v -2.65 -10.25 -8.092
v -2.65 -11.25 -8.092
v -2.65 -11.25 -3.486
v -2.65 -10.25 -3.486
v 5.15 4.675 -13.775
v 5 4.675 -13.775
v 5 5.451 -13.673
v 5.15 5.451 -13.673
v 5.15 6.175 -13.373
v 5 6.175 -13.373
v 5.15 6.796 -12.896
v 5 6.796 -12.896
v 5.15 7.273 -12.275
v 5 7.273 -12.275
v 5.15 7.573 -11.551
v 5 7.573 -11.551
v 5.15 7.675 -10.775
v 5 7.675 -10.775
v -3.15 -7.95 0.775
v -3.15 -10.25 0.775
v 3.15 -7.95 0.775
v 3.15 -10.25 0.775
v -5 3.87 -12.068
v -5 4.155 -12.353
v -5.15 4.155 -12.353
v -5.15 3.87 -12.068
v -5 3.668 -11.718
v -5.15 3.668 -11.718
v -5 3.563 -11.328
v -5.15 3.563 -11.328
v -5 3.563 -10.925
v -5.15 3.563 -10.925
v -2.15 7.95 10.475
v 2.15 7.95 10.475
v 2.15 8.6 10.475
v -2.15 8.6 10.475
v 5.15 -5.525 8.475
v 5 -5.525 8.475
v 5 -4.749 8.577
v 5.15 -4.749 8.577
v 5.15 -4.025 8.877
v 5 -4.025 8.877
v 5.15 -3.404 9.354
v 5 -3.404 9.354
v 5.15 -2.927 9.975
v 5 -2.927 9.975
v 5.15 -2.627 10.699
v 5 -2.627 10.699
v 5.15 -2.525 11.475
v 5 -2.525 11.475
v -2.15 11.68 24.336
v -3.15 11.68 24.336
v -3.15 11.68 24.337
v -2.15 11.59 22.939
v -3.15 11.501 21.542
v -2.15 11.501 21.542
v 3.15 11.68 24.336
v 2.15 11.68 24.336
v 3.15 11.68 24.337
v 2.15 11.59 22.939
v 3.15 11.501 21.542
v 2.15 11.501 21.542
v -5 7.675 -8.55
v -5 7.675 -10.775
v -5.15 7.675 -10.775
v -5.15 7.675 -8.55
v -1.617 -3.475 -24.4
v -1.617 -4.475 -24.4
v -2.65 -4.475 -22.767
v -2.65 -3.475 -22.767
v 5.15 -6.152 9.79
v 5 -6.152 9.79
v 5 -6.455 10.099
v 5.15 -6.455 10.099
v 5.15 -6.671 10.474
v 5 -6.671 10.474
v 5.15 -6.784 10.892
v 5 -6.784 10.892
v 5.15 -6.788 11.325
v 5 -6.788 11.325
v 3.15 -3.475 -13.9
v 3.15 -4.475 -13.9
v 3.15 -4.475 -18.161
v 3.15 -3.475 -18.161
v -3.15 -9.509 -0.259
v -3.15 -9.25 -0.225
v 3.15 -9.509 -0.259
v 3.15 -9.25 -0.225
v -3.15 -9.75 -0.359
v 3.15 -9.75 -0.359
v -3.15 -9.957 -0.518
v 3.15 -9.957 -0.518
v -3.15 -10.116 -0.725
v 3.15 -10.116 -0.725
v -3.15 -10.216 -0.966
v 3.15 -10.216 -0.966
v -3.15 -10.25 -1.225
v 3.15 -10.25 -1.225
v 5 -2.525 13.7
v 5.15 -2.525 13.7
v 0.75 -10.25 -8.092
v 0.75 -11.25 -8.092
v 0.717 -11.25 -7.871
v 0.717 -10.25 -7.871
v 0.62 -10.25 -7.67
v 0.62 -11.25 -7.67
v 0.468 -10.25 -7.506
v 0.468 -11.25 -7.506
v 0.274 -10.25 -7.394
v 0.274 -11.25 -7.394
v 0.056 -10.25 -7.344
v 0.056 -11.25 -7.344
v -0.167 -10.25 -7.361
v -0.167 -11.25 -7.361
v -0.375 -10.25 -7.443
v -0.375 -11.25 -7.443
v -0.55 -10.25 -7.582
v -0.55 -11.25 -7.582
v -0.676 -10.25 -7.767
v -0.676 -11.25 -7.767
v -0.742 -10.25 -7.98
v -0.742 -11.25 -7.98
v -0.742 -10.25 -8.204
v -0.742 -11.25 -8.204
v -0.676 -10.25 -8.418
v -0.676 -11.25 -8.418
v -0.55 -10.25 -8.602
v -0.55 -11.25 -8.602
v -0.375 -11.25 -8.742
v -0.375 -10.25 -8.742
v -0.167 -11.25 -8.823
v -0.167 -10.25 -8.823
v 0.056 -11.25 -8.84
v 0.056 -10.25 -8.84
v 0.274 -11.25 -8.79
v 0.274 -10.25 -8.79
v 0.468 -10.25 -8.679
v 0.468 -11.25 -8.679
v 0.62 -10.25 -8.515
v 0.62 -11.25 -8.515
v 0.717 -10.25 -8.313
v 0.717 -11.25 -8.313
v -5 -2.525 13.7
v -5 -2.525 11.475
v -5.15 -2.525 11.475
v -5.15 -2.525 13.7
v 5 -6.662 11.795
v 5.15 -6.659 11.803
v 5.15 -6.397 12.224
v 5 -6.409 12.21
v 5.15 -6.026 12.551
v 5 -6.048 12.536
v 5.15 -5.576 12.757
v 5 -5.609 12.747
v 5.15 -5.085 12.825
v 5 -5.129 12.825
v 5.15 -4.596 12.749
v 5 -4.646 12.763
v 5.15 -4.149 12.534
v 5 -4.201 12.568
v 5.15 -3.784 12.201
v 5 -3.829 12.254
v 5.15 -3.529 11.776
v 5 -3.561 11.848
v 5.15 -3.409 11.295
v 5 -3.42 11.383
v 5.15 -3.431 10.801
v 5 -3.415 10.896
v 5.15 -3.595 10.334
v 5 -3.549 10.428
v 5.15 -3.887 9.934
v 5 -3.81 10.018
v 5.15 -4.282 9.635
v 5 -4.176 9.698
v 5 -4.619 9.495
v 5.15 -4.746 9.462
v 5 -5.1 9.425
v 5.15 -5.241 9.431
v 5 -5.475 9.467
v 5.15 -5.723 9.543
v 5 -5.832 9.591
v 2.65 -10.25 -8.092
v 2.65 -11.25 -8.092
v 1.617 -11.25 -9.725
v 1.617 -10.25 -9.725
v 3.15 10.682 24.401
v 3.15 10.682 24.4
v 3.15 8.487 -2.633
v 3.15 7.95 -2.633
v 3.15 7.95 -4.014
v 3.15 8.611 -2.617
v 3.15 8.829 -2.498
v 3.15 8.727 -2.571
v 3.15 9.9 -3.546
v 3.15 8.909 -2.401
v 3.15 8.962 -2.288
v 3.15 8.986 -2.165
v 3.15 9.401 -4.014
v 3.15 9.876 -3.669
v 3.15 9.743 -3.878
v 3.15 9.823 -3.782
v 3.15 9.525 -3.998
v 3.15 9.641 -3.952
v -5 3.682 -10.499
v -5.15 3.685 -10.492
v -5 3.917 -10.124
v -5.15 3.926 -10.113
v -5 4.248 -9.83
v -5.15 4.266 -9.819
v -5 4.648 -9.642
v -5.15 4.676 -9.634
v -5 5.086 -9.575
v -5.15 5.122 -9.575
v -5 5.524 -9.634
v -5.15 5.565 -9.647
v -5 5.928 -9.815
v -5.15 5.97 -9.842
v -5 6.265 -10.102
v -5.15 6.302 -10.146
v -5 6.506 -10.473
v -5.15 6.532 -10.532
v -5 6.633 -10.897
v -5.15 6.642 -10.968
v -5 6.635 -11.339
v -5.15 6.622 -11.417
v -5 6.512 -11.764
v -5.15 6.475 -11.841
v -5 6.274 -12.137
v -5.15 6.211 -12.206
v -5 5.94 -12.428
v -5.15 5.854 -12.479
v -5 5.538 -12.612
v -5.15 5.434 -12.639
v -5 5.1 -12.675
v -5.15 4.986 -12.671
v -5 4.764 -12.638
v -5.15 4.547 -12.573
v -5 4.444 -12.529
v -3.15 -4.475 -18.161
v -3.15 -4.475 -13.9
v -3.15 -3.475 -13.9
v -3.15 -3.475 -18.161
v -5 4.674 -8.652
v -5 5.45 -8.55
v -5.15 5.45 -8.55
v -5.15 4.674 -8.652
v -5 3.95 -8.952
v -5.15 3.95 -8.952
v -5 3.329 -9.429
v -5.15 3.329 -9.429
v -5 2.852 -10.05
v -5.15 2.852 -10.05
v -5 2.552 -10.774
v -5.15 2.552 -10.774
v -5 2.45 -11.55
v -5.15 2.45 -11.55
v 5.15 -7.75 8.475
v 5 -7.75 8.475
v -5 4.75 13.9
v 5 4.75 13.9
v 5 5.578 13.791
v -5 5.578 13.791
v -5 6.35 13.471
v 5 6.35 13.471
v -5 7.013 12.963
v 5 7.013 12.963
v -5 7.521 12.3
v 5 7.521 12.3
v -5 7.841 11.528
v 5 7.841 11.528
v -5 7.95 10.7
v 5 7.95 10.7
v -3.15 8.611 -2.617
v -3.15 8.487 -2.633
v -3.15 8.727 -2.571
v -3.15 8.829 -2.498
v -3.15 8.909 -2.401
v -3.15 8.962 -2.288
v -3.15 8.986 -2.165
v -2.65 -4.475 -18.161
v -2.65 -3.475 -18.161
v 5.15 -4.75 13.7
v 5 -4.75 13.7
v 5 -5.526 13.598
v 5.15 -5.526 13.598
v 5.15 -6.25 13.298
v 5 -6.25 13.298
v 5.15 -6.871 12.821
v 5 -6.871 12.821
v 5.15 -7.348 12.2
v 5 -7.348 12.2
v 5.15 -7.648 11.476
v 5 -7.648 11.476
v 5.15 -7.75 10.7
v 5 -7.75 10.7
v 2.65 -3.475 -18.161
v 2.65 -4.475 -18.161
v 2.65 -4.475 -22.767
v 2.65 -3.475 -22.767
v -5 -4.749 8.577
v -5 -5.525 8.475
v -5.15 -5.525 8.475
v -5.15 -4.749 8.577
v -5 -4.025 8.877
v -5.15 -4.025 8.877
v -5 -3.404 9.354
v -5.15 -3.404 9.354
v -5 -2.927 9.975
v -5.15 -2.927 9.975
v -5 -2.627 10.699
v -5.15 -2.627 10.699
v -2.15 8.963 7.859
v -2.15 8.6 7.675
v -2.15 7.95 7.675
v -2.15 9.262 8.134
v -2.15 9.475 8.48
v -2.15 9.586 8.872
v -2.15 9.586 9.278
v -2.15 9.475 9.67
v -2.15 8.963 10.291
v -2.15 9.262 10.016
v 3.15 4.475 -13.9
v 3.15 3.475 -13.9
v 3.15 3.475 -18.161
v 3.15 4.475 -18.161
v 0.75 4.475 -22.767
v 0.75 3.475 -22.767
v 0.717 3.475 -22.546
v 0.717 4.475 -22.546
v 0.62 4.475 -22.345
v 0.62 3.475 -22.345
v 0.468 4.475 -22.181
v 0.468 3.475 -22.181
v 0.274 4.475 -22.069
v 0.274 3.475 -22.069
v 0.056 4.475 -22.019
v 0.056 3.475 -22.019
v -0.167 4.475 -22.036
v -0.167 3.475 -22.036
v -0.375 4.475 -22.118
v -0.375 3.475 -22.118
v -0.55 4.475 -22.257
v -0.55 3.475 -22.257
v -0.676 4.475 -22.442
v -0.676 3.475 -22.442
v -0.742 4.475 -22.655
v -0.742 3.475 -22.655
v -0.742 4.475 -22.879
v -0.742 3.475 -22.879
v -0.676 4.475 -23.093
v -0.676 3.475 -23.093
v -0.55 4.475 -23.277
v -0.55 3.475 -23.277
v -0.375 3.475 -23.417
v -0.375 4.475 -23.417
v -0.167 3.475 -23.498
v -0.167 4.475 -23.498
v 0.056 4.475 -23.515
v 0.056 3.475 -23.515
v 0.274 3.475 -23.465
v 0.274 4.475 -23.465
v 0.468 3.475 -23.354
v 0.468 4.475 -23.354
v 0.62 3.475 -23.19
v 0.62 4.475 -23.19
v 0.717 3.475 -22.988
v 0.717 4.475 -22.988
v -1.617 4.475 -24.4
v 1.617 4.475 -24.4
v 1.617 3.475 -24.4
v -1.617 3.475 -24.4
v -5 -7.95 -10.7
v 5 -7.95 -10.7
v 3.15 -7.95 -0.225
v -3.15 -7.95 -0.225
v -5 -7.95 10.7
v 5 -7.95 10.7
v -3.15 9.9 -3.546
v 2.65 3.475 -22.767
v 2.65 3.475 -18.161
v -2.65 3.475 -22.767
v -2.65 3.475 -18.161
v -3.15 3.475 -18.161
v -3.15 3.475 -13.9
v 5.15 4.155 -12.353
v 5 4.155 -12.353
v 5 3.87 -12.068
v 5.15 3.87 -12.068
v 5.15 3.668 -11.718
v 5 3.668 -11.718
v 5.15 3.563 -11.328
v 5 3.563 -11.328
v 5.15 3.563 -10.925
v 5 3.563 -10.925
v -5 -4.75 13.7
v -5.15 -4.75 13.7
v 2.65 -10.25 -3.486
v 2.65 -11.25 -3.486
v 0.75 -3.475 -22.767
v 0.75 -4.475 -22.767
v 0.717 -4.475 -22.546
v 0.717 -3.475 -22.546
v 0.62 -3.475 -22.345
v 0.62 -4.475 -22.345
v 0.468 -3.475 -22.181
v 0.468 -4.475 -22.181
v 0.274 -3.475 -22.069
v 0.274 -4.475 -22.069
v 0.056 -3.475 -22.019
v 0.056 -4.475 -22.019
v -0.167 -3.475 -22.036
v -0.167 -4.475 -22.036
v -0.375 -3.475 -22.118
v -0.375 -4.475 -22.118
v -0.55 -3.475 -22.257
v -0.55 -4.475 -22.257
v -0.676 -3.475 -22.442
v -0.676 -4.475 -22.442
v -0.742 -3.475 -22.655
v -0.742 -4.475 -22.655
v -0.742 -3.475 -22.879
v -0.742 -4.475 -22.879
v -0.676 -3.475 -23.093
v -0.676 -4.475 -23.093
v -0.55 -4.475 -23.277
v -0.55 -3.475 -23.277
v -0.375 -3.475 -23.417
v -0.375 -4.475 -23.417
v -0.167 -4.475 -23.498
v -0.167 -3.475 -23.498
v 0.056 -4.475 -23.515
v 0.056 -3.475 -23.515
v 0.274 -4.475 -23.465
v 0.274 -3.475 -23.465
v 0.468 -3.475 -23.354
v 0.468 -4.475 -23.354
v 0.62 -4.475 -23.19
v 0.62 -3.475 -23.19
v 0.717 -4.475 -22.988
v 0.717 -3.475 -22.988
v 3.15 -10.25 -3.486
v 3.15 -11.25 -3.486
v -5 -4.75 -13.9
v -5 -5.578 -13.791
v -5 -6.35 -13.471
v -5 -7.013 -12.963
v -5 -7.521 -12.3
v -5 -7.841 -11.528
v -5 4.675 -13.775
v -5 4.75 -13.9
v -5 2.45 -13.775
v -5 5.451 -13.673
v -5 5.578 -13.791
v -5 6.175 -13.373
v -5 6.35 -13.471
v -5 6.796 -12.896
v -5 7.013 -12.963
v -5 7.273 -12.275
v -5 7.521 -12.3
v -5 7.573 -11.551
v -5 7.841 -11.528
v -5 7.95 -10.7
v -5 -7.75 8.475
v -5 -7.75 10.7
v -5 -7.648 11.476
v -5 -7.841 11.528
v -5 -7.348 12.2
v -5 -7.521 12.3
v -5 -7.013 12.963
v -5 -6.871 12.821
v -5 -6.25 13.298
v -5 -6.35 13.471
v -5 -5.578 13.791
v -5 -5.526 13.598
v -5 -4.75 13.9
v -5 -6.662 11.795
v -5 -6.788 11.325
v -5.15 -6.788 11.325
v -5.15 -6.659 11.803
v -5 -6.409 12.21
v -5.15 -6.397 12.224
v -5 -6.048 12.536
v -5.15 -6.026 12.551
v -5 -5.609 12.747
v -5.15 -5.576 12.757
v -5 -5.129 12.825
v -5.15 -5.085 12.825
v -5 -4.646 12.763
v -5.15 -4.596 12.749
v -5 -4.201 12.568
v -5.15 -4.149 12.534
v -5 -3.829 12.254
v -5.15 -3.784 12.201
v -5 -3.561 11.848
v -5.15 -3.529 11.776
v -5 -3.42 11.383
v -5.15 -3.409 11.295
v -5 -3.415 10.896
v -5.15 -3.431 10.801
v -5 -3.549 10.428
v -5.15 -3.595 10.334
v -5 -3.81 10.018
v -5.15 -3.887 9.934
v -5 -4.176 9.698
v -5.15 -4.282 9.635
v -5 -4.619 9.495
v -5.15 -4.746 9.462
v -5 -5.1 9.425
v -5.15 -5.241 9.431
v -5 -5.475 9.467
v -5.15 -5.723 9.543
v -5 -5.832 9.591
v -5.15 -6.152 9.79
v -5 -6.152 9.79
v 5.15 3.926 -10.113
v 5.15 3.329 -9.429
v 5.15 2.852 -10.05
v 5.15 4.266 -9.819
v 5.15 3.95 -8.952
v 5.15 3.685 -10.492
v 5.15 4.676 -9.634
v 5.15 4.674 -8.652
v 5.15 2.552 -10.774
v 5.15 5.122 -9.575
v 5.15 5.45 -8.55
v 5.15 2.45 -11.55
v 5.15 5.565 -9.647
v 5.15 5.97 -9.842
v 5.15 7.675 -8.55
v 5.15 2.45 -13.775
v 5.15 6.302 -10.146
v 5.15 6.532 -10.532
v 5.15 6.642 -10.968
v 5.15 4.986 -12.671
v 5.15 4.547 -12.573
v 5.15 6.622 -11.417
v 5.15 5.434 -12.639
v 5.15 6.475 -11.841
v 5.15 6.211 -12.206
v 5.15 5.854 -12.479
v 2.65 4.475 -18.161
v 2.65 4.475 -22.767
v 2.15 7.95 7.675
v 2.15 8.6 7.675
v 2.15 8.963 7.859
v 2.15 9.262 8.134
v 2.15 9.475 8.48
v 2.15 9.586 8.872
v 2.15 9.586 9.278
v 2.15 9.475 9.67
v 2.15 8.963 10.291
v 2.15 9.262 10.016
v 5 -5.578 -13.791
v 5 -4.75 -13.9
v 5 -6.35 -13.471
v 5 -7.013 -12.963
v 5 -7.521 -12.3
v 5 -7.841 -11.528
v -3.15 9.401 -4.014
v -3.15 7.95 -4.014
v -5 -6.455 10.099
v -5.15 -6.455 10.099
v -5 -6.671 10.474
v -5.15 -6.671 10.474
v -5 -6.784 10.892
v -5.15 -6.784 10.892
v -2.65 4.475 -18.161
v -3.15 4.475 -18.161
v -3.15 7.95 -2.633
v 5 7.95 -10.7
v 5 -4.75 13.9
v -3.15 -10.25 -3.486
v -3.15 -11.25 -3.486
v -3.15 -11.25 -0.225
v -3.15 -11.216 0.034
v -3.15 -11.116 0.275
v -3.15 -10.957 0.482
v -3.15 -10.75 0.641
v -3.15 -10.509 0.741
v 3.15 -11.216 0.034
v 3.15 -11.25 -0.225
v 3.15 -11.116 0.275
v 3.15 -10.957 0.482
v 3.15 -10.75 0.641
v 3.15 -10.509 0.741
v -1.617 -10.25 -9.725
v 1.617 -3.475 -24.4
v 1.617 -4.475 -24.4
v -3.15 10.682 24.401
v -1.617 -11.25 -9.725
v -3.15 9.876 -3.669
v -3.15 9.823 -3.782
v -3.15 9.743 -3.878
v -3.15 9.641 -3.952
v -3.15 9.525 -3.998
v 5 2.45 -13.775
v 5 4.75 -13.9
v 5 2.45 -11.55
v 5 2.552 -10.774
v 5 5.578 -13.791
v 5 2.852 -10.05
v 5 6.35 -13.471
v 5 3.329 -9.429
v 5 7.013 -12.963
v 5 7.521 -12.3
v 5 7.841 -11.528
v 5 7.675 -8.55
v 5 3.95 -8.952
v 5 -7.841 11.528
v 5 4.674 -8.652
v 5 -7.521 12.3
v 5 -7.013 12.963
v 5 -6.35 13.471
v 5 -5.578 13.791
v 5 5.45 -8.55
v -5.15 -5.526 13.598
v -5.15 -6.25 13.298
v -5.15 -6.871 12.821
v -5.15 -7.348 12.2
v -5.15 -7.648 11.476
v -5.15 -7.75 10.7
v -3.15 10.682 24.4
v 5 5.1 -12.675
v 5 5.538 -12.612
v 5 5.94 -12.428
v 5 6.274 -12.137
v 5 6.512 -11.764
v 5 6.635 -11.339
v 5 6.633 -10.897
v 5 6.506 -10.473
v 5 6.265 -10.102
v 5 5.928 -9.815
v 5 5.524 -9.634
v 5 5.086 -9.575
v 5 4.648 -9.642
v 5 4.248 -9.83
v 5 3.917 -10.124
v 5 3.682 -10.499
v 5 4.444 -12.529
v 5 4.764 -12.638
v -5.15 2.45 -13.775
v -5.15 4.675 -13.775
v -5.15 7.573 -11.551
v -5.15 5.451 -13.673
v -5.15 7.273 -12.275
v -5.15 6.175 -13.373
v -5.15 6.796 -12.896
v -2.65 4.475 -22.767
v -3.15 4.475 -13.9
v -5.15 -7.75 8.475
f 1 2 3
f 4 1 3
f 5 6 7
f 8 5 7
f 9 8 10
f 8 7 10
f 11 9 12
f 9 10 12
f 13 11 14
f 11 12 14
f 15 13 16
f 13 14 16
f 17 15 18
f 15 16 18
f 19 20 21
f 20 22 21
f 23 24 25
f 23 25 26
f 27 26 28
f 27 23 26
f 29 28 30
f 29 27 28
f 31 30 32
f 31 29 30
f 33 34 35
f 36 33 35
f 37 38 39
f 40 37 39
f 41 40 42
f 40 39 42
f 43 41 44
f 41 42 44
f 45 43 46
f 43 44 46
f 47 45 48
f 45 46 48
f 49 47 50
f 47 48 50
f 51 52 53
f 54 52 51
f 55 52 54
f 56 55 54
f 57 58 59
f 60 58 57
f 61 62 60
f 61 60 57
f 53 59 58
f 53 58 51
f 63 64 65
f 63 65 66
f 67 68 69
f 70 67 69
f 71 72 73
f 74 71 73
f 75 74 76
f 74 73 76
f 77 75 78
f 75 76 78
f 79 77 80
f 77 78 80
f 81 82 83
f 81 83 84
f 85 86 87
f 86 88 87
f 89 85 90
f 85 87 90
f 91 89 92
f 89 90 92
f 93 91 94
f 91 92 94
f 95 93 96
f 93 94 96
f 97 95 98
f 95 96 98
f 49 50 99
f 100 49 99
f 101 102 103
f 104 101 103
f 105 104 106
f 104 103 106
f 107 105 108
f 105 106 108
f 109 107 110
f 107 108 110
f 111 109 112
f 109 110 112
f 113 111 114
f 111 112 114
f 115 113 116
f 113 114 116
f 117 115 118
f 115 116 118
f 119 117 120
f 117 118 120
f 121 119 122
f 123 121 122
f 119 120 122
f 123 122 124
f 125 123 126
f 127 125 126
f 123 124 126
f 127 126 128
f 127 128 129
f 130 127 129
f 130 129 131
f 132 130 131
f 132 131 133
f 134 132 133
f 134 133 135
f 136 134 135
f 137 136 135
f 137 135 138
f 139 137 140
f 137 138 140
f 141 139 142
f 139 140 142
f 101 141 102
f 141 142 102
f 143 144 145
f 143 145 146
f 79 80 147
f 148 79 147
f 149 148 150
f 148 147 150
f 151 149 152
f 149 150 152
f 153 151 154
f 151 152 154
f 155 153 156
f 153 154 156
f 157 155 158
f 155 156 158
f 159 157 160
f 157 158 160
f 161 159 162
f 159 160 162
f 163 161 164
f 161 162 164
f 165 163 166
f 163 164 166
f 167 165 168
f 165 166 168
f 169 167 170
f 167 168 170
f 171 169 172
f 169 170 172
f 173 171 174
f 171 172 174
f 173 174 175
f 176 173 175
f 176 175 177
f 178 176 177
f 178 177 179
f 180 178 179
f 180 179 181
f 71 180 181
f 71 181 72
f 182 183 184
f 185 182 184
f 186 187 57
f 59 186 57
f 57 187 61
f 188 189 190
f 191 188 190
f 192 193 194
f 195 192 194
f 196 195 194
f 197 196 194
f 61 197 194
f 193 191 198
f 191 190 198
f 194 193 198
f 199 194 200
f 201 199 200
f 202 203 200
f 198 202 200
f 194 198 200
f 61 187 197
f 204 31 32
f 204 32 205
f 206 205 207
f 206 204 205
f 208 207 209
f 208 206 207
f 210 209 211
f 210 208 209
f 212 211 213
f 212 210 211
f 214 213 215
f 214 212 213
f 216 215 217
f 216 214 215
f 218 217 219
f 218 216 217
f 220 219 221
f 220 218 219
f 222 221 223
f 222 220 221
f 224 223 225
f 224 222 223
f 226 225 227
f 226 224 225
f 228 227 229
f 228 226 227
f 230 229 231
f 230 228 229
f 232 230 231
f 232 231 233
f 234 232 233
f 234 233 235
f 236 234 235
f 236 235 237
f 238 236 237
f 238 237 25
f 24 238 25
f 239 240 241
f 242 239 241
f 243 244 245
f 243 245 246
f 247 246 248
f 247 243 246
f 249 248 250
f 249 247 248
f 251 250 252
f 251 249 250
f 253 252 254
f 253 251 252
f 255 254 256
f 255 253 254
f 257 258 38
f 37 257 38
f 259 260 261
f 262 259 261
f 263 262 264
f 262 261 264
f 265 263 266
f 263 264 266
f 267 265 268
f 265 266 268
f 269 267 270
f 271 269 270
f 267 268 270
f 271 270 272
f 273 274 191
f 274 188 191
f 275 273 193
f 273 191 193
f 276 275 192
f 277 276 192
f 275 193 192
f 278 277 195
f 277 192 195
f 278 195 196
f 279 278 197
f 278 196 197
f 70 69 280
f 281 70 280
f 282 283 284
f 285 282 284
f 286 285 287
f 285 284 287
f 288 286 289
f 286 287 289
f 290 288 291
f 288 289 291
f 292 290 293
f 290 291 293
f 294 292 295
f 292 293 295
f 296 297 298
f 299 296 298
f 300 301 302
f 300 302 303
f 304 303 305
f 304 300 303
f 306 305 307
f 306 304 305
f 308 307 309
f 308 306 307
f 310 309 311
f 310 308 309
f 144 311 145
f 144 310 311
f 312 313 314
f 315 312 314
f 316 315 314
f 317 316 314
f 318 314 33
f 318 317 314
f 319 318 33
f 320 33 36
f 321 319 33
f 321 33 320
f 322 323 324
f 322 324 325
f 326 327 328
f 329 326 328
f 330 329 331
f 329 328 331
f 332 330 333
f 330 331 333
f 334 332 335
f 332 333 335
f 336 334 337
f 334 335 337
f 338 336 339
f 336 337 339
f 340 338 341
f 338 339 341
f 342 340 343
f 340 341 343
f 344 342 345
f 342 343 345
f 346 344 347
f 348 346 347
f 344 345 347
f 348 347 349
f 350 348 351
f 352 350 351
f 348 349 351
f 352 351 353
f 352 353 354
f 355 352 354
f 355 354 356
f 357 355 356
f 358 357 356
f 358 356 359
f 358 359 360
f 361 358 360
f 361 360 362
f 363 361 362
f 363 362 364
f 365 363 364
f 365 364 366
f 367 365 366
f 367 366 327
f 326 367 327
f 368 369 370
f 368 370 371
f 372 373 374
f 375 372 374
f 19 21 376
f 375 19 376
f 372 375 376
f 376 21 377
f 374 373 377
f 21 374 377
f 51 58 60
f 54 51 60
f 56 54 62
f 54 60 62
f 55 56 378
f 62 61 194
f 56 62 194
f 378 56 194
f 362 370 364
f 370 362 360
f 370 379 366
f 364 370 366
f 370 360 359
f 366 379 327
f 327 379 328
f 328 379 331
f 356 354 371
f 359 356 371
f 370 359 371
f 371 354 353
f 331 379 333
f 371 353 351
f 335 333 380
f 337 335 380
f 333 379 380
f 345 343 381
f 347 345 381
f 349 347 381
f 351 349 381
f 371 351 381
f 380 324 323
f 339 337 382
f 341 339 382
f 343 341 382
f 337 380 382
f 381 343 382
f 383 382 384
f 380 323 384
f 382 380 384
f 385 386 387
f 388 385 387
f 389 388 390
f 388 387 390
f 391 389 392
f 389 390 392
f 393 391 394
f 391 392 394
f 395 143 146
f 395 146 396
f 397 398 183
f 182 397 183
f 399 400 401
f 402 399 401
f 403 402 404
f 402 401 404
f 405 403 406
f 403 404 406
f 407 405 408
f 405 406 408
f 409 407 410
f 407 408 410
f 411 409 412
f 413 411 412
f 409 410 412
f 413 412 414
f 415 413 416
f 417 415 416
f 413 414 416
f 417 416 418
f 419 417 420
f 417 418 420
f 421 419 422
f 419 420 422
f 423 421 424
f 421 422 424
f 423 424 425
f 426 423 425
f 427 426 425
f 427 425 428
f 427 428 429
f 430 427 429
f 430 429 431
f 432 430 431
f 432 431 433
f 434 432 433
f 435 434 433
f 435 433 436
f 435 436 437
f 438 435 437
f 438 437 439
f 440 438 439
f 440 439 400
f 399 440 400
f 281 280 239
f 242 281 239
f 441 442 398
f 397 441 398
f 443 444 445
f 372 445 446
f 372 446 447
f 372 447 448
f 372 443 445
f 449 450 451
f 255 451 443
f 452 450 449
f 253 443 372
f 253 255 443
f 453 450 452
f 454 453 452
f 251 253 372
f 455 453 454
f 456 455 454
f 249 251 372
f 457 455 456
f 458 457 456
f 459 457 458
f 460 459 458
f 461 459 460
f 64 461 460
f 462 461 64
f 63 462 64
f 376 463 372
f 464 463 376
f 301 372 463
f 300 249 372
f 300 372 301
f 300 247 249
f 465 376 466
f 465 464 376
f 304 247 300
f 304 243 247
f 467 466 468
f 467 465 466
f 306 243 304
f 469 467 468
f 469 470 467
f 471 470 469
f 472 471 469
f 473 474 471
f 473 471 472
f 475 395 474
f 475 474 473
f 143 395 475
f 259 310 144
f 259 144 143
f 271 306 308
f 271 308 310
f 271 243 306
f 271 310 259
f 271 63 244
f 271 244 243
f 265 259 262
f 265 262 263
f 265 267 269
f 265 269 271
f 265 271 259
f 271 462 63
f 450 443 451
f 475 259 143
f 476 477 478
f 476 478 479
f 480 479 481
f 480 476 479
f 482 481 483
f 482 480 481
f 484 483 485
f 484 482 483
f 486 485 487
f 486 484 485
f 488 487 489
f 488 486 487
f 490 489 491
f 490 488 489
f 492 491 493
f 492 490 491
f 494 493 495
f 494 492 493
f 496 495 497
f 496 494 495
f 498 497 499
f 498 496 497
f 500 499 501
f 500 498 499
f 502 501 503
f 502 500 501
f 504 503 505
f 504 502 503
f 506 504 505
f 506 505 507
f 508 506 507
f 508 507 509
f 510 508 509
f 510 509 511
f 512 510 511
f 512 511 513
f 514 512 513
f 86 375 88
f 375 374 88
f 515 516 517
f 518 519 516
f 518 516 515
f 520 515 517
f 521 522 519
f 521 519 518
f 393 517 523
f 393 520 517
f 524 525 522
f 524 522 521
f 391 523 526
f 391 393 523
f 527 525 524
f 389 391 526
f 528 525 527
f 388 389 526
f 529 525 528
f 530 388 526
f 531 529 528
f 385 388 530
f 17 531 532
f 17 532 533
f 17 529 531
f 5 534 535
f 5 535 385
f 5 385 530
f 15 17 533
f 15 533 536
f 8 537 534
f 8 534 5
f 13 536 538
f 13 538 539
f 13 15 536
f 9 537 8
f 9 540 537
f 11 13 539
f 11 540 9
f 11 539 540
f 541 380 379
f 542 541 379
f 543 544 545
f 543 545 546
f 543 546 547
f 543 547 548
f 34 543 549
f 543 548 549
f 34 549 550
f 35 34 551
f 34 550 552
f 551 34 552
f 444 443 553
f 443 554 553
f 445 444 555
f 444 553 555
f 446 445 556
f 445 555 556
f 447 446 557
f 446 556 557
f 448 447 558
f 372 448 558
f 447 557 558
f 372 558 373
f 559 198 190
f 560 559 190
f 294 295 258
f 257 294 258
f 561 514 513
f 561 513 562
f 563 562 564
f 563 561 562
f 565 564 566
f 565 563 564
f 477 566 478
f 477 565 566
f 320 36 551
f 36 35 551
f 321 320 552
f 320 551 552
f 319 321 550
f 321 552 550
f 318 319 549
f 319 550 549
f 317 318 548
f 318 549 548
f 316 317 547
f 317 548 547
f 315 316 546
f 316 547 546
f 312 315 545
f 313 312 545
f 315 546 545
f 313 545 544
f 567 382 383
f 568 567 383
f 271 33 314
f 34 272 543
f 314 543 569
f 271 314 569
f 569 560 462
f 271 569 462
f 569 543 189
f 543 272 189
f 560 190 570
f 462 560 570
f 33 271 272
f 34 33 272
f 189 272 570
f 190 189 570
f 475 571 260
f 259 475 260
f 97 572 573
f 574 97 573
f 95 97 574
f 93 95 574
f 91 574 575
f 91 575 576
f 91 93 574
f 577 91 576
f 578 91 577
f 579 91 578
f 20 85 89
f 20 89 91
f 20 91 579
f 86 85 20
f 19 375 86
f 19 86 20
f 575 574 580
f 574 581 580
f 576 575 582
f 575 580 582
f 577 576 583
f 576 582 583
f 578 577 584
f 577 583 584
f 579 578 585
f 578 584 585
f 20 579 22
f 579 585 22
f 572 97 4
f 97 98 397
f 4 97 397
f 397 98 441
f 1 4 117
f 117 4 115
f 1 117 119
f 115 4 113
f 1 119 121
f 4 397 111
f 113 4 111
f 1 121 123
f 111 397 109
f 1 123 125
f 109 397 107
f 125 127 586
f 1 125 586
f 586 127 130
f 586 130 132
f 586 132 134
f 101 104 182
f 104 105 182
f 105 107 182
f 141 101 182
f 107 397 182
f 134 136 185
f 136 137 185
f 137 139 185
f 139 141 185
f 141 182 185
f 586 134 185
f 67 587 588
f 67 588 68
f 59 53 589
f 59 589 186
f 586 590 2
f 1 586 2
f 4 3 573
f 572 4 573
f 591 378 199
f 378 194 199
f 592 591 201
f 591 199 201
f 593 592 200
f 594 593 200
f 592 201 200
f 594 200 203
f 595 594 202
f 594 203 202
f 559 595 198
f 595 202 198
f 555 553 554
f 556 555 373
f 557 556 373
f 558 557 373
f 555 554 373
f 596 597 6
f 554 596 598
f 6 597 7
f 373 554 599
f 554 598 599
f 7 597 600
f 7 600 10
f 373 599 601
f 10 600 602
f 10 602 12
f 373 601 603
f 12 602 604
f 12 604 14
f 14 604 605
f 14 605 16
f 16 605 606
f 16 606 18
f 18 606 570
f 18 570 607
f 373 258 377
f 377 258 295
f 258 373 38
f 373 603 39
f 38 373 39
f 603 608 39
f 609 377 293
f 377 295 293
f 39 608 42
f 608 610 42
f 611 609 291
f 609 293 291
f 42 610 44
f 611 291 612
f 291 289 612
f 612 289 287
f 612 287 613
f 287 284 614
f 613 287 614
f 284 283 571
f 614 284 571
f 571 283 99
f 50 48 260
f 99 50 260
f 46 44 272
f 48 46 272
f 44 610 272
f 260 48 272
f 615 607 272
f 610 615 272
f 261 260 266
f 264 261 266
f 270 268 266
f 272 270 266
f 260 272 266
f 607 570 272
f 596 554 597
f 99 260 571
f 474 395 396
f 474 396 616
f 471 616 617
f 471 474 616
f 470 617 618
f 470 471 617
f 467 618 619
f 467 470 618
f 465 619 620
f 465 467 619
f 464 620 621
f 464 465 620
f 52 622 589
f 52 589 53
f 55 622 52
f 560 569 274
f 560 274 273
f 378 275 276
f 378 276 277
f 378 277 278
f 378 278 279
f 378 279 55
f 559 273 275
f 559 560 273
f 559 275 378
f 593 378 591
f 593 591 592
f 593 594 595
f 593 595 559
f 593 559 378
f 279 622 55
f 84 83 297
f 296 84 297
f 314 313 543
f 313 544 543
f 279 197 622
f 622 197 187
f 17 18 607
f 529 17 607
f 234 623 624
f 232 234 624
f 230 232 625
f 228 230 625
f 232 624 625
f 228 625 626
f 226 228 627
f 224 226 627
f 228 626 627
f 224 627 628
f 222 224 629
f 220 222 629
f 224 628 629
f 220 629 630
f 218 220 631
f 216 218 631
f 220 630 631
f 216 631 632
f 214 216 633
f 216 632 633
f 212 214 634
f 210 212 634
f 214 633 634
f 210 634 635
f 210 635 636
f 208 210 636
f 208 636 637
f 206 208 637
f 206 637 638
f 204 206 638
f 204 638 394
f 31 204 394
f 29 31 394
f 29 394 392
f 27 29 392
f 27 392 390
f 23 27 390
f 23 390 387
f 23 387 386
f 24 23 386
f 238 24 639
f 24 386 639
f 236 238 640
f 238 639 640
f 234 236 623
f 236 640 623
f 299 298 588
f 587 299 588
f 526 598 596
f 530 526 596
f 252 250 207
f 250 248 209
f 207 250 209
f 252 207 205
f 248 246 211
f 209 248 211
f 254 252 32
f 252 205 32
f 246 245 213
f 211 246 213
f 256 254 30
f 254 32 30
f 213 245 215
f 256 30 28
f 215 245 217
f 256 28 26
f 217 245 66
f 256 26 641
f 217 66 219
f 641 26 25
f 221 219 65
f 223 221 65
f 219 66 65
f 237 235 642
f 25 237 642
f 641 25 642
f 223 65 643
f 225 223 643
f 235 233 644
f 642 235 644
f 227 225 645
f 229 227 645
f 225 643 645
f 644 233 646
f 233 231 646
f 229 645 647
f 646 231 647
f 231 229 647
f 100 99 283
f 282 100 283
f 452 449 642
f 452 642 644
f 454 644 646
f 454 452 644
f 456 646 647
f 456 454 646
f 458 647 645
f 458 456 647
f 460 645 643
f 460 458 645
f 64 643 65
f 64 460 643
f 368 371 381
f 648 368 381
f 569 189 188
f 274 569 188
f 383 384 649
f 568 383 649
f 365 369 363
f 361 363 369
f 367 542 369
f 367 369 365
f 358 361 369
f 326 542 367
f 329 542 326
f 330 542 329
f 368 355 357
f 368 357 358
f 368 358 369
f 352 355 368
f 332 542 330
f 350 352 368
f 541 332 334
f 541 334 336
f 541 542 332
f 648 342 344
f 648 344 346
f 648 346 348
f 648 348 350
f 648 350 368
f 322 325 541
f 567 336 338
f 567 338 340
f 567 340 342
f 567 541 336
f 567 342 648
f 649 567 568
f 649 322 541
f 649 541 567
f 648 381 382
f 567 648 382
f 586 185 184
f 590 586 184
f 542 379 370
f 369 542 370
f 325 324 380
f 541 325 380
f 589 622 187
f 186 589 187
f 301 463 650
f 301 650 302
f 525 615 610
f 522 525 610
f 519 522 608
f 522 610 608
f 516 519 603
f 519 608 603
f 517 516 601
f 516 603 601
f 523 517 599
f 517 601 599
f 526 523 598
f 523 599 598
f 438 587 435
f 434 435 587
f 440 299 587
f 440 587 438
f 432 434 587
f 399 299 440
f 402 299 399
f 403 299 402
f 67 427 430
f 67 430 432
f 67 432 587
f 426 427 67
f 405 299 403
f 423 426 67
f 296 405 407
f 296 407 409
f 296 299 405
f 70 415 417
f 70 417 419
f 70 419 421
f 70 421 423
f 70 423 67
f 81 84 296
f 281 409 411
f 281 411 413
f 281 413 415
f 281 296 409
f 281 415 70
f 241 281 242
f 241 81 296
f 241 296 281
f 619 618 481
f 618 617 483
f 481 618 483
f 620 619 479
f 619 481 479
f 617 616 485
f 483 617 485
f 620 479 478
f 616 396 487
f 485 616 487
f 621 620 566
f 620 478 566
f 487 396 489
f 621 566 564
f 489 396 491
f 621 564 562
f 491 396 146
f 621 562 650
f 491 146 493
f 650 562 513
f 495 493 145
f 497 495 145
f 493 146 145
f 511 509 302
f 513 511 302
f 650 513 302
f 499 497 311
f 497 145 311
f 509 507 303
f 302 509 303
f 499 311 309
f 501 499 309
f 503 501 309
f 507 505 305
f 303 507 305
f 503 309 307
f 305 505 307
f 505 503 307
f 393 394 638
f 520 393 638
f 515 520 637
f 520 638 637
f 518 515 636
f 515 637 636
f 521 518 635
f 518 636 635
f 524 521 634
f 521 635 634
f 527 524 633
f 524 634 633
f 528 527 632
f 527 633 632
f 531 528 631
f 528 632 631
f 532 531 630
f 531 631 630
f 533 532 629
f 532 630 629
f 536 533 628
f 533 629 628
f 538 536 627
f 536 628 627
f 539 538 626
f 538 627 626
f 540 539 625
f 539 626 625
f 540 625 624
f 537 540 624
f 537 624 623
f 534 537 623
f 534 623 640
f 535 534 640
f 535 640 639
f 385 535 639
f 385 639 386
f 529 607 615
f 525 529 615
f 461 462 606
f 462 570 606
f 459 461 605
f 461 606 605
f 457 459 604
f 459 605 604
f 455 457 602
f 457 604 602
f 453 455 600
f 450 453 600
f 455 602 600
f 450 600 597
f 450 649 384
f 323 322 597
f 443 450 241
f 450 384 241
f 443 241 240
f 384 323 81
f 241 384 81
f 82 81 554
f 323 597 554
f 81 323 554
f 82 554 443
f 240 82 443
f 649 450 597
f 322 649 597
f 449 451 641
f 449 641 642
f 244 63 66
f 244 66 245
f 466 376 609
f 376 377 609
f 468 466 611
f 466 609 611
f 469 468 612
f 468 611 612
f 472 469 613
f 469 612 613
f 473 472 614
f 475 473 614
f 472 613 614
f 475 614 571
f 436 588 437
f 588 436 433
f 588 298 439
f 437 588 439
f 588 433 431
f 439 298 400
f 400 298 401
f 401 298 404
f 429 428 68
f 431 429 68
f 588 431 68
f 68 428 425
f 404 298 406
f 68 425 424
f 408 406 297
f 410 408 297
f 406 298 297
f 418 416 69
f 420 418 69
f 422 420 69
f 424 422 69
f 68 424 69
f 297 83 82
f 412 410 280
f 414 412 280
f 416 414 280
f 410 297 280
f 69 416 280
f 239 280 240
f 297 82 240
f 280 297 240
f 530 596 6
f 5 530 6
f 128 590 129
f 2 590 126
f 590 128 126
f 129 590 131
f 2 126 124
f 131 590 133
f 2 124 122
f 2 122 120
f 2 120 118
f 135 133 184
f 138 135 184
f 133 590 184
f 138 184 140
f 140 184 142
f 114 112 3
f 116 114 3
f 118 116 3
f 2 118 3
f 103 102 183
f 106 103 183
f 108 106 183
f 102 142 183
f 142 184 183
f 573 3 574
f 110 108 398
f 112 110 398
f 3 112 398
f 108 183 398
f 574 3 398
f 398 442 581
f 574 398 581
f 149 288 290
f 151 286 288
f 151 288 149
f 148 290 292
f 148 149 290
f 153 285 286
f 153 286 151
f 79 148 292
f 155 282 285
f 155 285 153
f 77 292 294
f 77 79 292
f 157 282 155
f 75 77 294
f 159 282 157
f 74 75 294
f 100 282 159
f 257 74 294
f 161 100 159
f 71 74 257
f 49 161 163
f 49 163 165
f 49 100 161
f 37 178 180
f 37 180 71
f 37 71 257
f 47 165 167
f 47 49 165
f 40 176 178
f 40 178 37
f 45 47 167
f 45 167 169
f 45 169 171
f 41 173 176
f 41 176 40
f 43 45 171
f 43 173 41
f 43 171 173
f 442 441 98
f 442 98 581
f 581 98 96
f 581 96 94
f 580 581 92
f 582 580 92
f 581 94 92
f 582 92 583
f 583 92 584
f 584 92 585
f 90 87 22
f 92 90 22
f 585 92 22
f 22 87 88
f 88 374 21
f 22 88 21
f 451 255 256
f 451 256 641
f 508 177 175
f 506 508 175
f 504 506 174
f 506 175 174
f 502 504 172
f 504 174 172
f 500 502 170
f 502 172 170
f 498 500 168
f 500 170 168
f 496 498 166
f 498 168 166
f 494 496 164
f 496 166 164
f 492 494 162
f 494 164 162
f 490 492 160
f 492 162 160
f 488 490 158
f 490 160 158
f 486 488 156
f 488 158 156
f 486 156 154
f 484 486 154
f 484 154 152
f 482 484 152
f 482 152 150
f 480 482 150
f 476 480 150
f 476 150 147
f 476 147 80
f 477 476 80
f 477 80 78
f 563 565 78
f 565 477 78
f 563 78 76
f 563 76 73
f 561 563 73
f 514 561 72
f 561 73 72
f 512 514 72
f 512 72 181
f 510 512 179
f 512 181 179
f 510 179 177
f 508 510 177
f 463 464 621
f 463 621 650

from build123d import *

# Parameters (mm, degrees)
BLOCOBASE_DEPTH           = 5
SKFIXACAO_R               = 1.7
SKFIXACAO_R_2             = 1.55
FIXACAO_DEPTH             = 5.15
RESSALTOFIXACAO_DEPTH     = 0.15
BOTAO_DEPTH               = 2.15
SKETCH5_W                 = 6.3
SKETCH5_H                 = 1
BASECONECTORNONC_DEPTH    = 10.5
SKDESENHOCONECTORNONC_R   = 0.75
DESENHOCONECTORNONC_DEPTH = 20.5
BASECONECTORCOM_DEPTH     = 3.15
SKDESENHOCONECTORCOM_R    = 0.75
DESENHOCONECTORCOM_DEPTH  = 1
BASECONTATO_DEPTH         = 3.15
SKAPOIOROLO_R             = 0.7
APOIOROLO_DEPTH           = 1
SKROLO_R                  = 2.5
ROLO_DEPTH                = 4.3
SKETCH6_W                 = 15.037683952
SKETCH6_H                 = 10.848275608
CUT_EXTRUDE1_DEPTH        = 10
SKETCH7_W                 = 6.3
SKETCH7_H                 = 1
BOSS_EXTRUDE1_DEPTH       = 0.001


with BuildPart() as part:
    # skBlocoBase → BlocoBase (new body, symmetric)
    with BuildSketch(Plane(origin=(0, 0, 0), x_dir=(0, 0, -1), z_dir=(1, 0, 0))):
        with BuildLine():
            Line((-10.7, 7.95), (10.7, 7.95))
            ThreePointArc((10.7, 7.95), (12.9627417, 7.0127417), (13.9, 4.75))
            Line((13.9, 4.75), (13.9, -4.75))
            ThreePointArc((13.9, -4.75), (12.9627417, -7.0127417), (10.7, -7.95))
            Line((10.7, -7.95), (-10.7, -7.95))
            ThreePointArc((-10.7, -7.95), (-12.9627417, -7.0127417), (-13.9, -4.75))
            Line((-13.9, -4.75), (-13.9, 4.75))
            ThreePointArc((-13.9, 4.75), (-12.9627417, 7.0127417), (-10.7, 7.95))
        make_face()
    extrude(amount=BLOCOBASE_DEPTH, both=True)

    # skFixacao → Fixacao (cut, symmetric)
    with BuildSketch(Plane(origin=(0, 0, 0), x_dir=(0, 0, -1), z_dir=(1, 0, 0))):
        with Locations((-11.125, -5.1)):
            Circle(SKFIXACAO_R)
        with Locations((11.125, 5.1)):
            Circle(SKFIXACAO_R_2)
    extrude(amount=FIXACAO_DEPTH, both=True, mode=Mode.SUBTRACT)

    # skRessaltoFixacao → RessaltoFixacao (add)
    with BuildSketch(Plane(origin=(5, 0, 0), x_dir=(0, 0, -1), z_dir=(1, 0, 0))):
        with BuildLine():
            ThreePointArc((-8.475, -5.525), (-9.353679656, -3.403679656), (-11.475, -2.525))
            Line((-11.475, -2.525), (-13.7, -2.525))
            Line((-13.7, -2.525), (-13.7, -4.75))
            ThreePointArc((-13.7, -4.75), (-12.821320344, -6.871320344), (-10.7, -7.75))
            Line((-10.7, -7.75), (-8.475, -7.75))
            Line((-8.475, -7.75), (-8.475, -5.525))
        make_face()
        with BuildLine():
            ThreePointArc((-9.789845005, -6.152312282), (-10.474438165, -6.670595205), (-11.325, -6.788194302))
            ThreePointArc((-11.325, -6.788194302), (-11.775561835, -3.529404795), (-9.789845005, -6.152312282))
        make_face(mode=Mode.SUBTRACT)
        with BuildLine():
            ThreePointArc((13.775, 4.675), (12.896320344, 6.796320344), (10.775, 7.675))
            Line((10.775, 7.675), (8.55, 7.675))
            Line((8.55, 7.675), (8.55, 5.45))
            ThreePointArc((8.55, 5.45), (9.428679656, 3.328679656), (11.55, 2.45))
            Line((11.55, 2.45), (13.775, 2.45))
            Line((13.775, 2.45), (13.775, 4.675))
        make_face()
        with BuildLine():
            ThreePointArc((12.353274612, 4.1545681), (11.71815932, 3.667986725), (10.925, 3.562957385))
            ThreePointArc((10.925, 3.562957385), (10.53184068, 6.532013275), (12.353274612, 4.1545681))
        make_face(mode=Mode.SUBTRACT)
    ressaltofixacao = extrude(amount=RESSALTOFIXACAO_DEPTH)

    # MirrorRessaltoFixacao: RessaltoFixacao across plane
    add(ressaltofixacao.mirror(Plane(origin=(0, 0, 0), x_dir=(0, 0, 1), z_dir=(1, 0, 0))))

    # skBotao → Botao (add, symmetric)
    with BuildSketch(Plane(origin=(0, 0, 0), x_dir=(0, 0, -1), z_dir=(1, 0, 0))):
        with BuildLine():
            Line((-10.475, 7.95), (-10.475, 8.6))
            ThreePointArc((-10.475, 8.6), (-9.075, 9.6), (-7.675, 8.6))
            Line((-7.675, 8.6), (-7.675, 7.95))
            Line((-7.675, 7.95), (-10.475, 7.95))
        make_face()
    extrude(amount=BOTAO_DEPTH, both=True)

    # Sketch5 → BaseConectorNONC (add)
    with BuildSketch(Plane(origin=(0, 0, -13.9), x_dir=(-1, 0, 0), z_dir=(0, 0, -1))):
        with Locations((0, -3.975)):
            Rectangle(SKETCH5_W, SKETCH5_H)
        with Locations((0, 3.975)):
            Rectangle(SKETCH5_W, SKETCH5_H)
    extrude(amount=BASECONECTORNONC_DEPTH)

    # skDesenhoConectorNONC → DesenhoConectorNONC (cut)
    with BuildSketch(Plane.XZ.offset(4.475)):
        Polygon((2.65, -22.767142952), (1.616967042, -24.4), (3.15, -24.4), (3.15, -18.161236833), (2.65, -18.161236833), align=None)
        Polygon((-3.15, -24.4), (-1.616967042, -24.4), (-2.65, -22.767142952), (-2.65, -18.161236833), (-3.15, -18.161236833), align=None)
        with Locations((0, -22.767142952)):
            Circle(SKDESENHOCONECTORNONC_R)
    extrude(amount=-DESENHOCONECTORNONC_DEPTH, mode=Mode.SUBTRACT)

    # skBaseConectorCOM → BaseConectorCOM (add, symmetric)
    with BuildSketch(Plane(origin=(0, 0, 0), x_dir=(0, 0, -1), z_dir=(1, 0, 0))):
        with BuildLine():
            Line((9.725, -11.25), (0.225, -11.25))
            ThreePointArc((0.225, -11.25), (-0.482106781, -10.957106781), (-0.775, -10.25))
            Line((-0.775, -10.25), (-0.775, -7.95))
            Line((-0.775, -7.95), (0.225, -7.95))
            Line((0.225, -7.95), (0.225, -9.25))
            ThreePointArc((0.225, -9.25), (0.517893219, -9.957106781), (1.225, -10.25))
            Line((1.225, -10.25), (9.725, -10.25))
            Line((9.725, -10.25), (9.725, -11.25))
        make_face()
    extrude(amount=BASECONECTORCOM_DEPTH, both=True)

    # skDesenhoConectorCOM → DesenhoConectorCOM (cut)
    with BuildSketch(Plane.XZ.offset(11.25)):
        Polygon((2.65, -8.092142952), (1.616967042, -9.725), (3.15, -9.725), (3.15, -3.486236833), (2.65, -3.486236833), align=None)
        Polygon((-3.15, -9.725), (-1.616967042, -9.725), (-2.65, -8.092142952), (-2.65, -3.486236833), (-3.15, -3.486236833), align=None)
        with Locations((0, -8.092142952)):
            Circle(SKDESENHOCONECTORCOM_R)
    extrude(amount=-DESENHOCONECTORCOM_DEPTH, mode=Mode.SUBTRACT)

    # skBaseContato → BaseContato (add, symmetric)
    with BuildSketch(Plane(origin=(0, 0, 0), x_dir=(0, 0, -1), z_dir=(1, 0, 0))):
        with BuildLine():
            Line((2.63302332, 7.95), (2.63302332, 8.486635004))
            ThreePointArc((2.63302332, 8.486635004), (2.497665983, 8.828739854), (2.164880406, 8.985619098))
            Line((2.164880406, 8.985619098), (-24.4, 10.681624431))
            Line((-24.4, 10.681624431), (-24.336285828, 11.679592619))
            Line((-24.336285828, 11.679592619), (3.545575005, 9.899506131))
            ThreePointArc((3.545575005, 9.899506131), (3.878360582, 9.742626887), (4.013717919, 9.400522037))
            Line((4.013717919, 9.400522037), (4.013717919, 7.95))
            Line((4.013717919, 7.95), (2.63302332, 7.95))
        make_face()
    extrude(amount=BASECONTATO_DEPTH, both=True)

    # skApoioRolo → ApoioRolo (add)
    with BuildSketch(Plane(origin=(3.15, 0, 0), x_dir=(0, 0, -1), z_dir=(1, 0, 0))):
        with BuildLine():
            ThreePointArc((-21.354211514, 14.486814776), (-22.754211514, 15.886814776), (-24.154211514, 14.486814776))
            Line((-24.154211514, 14.486814776), (-24.336285828, 11.679592619))
            Line((-24.336285828, 11.679592619), (-22.939130364, 11.590392778))
            Line((-22.939130364, 11.590392778), (-21.541974901, 11.501192936))
            Line((-21.541974901, 11.501192936), (-21.365242034, 14.3114187))
            Line((-21.365242034, 14.3114187), (-21.354211514, 14.486814776))
        make_face()
        with Locations((-22.754211514, 14.486814776)):
            Circle(SKAPOIOROLO_R, mode=Mode.SUBTRACT)
    apoiorolo = extrude(amount=-APOIOROLO_DEPTH)

    # MirrorApoioRolo: ApoioRolo across plane
    add(apoiorolo.mirror(Plane(origin=(0, 0, 0), x_dir=(0, 0, 1), z_dir=(1, 0, 0))))

    # skRolo → Rolo (add)
    with BuildSketch(Plane.ZY.offset(-2.15)):
        with Locations((22.754211514, 14.486814776)):
            Circle(SKROLO_R)
    extrude(amount=ROLO_DEPTH)

    # Sketch6 → Cut-Extrude1 (cut)
    with BuildSketch(Plane(origin=(0, 10.084763511, -0.643850544), x_dir=(1, 0, 0), z_dir=(0, 0.997968188, -0.063714172))):
        with Locations((-4.368841976, -23.671158356)):
            Rectangle(SKETCH6_W, SKETCH6_H)
    extrude(amount=CUT_EXTRUDE1_DEPTH, mode=Mode.SUBTRACT)

    # Sketch7 → Boss-Extrude1 (add)
    with BuildSketch(Plane(origin=(0, 1.594829108, 24.980136372), x_dir=(1, 0, 0), z_dir=(0, 0.063714172, 0.997968188))):
        with Locations((0, 9.605295572)):
            Rectangle(SKETCH7_W, SKETCH7_H)
    extrude(amount=BOSS_EXTRUDE1_DEPTH)


solid = part.part
